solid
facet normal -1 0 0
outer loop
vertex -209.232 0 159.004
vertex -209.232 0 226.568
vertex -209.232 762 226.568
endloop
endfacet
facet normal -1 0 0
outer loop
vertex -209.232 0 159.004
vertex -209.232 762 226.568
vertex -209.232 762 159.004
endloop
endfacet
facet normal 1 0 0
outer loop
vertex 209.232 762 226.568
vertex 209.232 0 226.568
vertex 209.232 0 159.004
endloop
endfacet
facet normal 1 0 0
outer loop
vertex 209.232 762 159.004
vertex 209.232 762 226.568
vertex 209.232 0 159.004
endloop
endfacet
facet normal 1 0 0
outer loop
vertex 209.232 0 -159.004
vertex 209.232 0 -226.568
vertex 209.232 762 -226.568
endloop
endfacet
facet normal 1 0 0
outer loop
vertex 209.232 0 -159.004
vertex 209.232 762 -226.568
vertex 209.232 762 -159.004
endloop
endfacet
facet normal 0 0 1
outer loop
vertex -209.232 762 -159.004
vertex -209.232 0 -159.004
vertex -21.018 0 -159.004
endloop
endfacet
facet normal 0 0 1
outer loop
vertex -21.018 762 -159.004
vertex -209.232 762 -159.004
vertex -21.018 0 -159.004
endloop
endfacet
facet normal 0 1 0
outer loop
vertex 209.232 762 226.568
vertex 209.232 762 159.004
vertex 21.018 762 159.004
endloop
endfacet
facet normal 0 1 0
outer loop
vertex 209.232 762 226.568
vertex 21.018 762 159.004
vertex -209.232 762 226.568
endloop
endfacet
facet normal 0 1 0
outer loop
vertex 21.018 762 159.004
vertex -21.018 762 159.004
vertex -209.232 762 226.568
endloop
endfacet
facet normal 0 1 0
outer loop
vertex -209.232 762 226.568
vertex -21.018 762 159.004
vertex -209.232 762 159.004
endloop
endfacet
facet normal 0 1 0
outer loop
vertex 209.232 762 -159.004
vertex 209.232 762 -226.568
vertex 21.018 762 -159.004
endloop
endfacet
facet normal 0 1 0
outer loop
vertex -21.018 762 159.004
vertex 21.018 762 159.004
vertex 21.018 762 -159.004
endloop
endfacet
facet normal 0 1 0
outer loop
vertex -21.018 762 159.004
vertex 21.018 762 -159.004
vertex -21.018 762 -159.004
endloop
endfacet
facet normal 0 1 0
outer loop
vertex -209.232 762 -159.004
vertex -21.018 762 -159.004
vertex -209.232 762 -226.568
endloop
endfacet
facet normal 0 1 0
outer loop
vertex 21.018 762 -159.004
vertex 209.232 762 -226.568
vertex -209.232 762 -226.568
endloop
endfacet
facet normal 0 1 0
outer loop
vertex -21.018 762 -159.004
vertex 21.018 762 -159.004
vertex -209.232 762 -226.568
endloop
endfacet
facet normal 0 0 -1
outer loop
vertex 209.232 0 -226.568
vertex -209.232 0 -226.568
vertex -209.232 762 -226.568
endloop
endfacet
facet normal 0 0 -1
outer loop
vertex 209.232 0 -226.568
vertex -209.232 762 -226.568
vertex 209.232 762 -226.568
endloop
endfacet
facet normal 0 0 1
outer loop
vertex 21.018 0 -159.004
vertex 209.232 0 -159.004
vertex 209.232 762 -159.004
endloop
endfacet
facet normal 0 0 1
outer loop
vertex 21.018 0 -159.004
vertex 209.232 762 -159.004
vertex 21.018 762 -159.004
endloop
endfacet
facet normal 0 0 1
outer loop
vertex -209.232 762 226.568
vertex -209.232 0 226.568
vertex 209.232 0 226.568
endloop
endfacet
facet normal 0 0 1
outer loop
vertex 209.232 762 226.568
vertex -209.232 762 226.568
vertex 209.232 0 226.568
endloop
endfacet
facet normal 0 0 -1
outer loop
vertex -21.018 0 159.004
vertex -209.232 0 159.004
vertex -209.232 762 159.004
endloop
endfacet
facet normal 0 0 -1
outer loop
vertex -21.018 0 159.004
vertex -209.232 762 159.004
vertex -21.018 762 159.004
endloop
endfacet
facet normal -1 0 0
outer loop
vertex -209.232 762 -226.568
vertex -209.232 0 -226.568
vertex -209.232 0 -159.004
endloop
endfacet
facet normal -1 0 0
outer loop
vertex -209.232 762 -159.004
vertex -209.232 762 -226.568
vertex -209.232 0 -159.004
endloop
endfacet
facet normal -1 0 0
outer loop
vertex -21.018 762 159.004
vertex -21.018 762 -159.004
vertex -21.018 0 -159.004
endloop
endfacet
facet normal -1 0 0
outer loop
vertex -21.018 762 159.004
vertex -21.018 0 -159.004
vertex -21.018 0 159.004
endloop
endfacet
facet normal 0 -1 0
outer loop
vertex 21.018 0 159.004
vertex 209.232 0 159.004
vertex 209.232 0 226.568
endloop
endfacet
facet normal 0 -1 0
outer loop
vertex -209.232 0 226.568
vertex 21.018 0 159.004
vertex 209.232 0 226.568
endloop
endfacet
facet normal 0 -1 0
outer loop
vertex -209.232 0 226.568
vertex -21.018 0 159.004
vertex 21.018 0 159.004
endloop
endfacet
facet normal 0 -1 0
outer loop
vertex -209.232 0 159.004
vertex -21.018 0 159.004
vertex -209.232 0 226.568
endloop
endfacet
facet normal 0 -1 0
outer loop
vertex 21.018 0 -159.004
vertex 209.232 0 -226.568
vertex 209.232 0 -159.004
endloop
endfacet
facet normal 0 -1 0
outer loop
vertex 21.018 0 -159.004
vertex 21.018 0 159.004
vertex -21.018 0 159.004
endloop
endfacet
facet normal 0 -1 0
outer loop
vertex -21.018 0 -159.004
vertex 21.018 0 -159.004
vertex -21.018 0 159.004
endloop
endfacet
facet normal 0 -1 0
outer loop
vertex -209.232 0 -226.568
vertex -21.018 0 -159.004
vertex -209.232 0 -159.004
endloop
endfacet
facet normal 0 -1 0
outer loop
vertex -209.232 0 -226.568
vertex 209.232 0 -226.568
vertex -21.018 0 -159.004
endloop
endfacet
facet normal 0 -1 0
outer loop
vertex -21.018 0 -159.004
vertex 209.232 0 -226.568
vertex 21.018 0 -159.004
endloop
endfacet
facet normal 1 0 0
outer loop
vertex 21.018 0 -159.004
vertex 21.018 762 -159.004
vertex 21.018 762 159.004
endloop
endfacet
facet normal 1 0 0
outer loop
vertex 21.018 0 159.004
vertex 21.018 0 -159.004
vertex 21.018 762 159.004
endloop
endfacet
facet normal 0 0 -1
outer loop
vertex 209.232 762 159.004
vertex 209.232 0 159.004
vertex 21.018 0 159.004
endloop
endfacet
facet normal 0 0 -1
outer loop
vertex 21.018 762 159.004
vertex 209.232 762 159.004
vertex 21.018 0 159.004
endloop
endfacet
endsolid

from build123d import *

# Parameters (mm, degrees)
F1_DEPTH = 762


with BuildPart() as f1:
    # F0 (on Front) → F1 (new body)
    with BuildSketch(Plane.XZ):
        Polygon((-21.0185, 0), (0, 0), (0, 226.568), (-209.2325, 226.568), (-209.2325, 159.004), (-21.0185, 159.004), align=None)
    extrude(amount=-F1_DEPTH)

    # F2: F1 across plane


with BuildPart() as f1_1:
    add(f1.part)
    add(f1.part.mirror(Plane.XY))

    # F3: F1 across plane


with BuildPart() as f1_2:
    add(f1_1.part)
    add(f1_1.part.mirror(Plane.YZ))


solid = f1_2.part
